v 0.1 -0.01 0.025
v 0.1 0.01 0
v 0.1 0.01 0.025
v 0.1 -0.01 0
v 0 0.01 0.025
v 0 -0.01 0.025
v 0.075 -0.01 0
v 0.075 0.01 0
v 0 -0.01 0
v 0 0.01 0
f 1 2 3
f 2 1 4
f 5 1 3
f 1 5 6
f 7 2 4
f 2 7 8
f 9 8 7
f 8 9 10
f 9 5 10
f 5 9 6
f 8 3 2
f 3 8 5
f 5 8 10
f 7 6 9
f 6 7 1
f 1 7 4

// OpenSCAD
s = 1;

length = 0.1;
width = 0.025;
depth = 0.020;
chfdepth = 0;
chfangle = 45;
cutpos = 0.075;
cutdepth = 0.0;
cutangle = 90;
cuttilt = 0;

/* Produces basic box finger */
module basicShape(length, width, depth)
{
	translate([0, -depth/2, 0]) cube([length, depth, width]);
}

/* Produces the chamfering geometry.
 * length -- length of the finger
 * start_depth -- distance from the finger plane at which the chamfer starts
 * angle --- chamfering angle
 */
module chamfering(length, start_depth, angle) {
	size = 1000;

	translate([length, 0, start_depth])
		rotate([0, 90-angle, 0])
			translate([0, 0, size/2])
				cube(size, center = true);
}

/* Produces the geometry for the cutout.
 * cutpos -- position of the cutout
 * cutdepth -- depth of the cutout
 * cutangle -- the angle of the cutout
 * cuttilt -- the tilt of the cutout
 */
module cutout(cutpos, cutdepth, cutangle, cuttilt) {
	size = 1000;

	s_x = tan(cutangle /2);

	translate([cutpos, 0, cutdepth])
		rotate([0, 0, cuttilt])
			rotate([0, 135, 0])
				translate([0, -size/2, 0])
					scale([s_x, 1, 1])
						cube(size);
}

/* Produces the finger geometry.
 * Parameters...
 */
module finger(length, width, depth, chfdepth, chfangle, cutpos, cutdepth, cutangle, cuttilt) {
	difference() {
		difference() {
			basicShape(length, width, depth);
			chamfering(length, width - width * chfdepth, chfangle);

echo(depth - chfdepth);
		}
		cutout(cutpos, cutdepth, cutangle, cuttilt);
	}
}

scale(s)
	finger(length, width, depth, chfdepth, chfangle, cutpos, cutdepth, cutangle, cuttilt);
